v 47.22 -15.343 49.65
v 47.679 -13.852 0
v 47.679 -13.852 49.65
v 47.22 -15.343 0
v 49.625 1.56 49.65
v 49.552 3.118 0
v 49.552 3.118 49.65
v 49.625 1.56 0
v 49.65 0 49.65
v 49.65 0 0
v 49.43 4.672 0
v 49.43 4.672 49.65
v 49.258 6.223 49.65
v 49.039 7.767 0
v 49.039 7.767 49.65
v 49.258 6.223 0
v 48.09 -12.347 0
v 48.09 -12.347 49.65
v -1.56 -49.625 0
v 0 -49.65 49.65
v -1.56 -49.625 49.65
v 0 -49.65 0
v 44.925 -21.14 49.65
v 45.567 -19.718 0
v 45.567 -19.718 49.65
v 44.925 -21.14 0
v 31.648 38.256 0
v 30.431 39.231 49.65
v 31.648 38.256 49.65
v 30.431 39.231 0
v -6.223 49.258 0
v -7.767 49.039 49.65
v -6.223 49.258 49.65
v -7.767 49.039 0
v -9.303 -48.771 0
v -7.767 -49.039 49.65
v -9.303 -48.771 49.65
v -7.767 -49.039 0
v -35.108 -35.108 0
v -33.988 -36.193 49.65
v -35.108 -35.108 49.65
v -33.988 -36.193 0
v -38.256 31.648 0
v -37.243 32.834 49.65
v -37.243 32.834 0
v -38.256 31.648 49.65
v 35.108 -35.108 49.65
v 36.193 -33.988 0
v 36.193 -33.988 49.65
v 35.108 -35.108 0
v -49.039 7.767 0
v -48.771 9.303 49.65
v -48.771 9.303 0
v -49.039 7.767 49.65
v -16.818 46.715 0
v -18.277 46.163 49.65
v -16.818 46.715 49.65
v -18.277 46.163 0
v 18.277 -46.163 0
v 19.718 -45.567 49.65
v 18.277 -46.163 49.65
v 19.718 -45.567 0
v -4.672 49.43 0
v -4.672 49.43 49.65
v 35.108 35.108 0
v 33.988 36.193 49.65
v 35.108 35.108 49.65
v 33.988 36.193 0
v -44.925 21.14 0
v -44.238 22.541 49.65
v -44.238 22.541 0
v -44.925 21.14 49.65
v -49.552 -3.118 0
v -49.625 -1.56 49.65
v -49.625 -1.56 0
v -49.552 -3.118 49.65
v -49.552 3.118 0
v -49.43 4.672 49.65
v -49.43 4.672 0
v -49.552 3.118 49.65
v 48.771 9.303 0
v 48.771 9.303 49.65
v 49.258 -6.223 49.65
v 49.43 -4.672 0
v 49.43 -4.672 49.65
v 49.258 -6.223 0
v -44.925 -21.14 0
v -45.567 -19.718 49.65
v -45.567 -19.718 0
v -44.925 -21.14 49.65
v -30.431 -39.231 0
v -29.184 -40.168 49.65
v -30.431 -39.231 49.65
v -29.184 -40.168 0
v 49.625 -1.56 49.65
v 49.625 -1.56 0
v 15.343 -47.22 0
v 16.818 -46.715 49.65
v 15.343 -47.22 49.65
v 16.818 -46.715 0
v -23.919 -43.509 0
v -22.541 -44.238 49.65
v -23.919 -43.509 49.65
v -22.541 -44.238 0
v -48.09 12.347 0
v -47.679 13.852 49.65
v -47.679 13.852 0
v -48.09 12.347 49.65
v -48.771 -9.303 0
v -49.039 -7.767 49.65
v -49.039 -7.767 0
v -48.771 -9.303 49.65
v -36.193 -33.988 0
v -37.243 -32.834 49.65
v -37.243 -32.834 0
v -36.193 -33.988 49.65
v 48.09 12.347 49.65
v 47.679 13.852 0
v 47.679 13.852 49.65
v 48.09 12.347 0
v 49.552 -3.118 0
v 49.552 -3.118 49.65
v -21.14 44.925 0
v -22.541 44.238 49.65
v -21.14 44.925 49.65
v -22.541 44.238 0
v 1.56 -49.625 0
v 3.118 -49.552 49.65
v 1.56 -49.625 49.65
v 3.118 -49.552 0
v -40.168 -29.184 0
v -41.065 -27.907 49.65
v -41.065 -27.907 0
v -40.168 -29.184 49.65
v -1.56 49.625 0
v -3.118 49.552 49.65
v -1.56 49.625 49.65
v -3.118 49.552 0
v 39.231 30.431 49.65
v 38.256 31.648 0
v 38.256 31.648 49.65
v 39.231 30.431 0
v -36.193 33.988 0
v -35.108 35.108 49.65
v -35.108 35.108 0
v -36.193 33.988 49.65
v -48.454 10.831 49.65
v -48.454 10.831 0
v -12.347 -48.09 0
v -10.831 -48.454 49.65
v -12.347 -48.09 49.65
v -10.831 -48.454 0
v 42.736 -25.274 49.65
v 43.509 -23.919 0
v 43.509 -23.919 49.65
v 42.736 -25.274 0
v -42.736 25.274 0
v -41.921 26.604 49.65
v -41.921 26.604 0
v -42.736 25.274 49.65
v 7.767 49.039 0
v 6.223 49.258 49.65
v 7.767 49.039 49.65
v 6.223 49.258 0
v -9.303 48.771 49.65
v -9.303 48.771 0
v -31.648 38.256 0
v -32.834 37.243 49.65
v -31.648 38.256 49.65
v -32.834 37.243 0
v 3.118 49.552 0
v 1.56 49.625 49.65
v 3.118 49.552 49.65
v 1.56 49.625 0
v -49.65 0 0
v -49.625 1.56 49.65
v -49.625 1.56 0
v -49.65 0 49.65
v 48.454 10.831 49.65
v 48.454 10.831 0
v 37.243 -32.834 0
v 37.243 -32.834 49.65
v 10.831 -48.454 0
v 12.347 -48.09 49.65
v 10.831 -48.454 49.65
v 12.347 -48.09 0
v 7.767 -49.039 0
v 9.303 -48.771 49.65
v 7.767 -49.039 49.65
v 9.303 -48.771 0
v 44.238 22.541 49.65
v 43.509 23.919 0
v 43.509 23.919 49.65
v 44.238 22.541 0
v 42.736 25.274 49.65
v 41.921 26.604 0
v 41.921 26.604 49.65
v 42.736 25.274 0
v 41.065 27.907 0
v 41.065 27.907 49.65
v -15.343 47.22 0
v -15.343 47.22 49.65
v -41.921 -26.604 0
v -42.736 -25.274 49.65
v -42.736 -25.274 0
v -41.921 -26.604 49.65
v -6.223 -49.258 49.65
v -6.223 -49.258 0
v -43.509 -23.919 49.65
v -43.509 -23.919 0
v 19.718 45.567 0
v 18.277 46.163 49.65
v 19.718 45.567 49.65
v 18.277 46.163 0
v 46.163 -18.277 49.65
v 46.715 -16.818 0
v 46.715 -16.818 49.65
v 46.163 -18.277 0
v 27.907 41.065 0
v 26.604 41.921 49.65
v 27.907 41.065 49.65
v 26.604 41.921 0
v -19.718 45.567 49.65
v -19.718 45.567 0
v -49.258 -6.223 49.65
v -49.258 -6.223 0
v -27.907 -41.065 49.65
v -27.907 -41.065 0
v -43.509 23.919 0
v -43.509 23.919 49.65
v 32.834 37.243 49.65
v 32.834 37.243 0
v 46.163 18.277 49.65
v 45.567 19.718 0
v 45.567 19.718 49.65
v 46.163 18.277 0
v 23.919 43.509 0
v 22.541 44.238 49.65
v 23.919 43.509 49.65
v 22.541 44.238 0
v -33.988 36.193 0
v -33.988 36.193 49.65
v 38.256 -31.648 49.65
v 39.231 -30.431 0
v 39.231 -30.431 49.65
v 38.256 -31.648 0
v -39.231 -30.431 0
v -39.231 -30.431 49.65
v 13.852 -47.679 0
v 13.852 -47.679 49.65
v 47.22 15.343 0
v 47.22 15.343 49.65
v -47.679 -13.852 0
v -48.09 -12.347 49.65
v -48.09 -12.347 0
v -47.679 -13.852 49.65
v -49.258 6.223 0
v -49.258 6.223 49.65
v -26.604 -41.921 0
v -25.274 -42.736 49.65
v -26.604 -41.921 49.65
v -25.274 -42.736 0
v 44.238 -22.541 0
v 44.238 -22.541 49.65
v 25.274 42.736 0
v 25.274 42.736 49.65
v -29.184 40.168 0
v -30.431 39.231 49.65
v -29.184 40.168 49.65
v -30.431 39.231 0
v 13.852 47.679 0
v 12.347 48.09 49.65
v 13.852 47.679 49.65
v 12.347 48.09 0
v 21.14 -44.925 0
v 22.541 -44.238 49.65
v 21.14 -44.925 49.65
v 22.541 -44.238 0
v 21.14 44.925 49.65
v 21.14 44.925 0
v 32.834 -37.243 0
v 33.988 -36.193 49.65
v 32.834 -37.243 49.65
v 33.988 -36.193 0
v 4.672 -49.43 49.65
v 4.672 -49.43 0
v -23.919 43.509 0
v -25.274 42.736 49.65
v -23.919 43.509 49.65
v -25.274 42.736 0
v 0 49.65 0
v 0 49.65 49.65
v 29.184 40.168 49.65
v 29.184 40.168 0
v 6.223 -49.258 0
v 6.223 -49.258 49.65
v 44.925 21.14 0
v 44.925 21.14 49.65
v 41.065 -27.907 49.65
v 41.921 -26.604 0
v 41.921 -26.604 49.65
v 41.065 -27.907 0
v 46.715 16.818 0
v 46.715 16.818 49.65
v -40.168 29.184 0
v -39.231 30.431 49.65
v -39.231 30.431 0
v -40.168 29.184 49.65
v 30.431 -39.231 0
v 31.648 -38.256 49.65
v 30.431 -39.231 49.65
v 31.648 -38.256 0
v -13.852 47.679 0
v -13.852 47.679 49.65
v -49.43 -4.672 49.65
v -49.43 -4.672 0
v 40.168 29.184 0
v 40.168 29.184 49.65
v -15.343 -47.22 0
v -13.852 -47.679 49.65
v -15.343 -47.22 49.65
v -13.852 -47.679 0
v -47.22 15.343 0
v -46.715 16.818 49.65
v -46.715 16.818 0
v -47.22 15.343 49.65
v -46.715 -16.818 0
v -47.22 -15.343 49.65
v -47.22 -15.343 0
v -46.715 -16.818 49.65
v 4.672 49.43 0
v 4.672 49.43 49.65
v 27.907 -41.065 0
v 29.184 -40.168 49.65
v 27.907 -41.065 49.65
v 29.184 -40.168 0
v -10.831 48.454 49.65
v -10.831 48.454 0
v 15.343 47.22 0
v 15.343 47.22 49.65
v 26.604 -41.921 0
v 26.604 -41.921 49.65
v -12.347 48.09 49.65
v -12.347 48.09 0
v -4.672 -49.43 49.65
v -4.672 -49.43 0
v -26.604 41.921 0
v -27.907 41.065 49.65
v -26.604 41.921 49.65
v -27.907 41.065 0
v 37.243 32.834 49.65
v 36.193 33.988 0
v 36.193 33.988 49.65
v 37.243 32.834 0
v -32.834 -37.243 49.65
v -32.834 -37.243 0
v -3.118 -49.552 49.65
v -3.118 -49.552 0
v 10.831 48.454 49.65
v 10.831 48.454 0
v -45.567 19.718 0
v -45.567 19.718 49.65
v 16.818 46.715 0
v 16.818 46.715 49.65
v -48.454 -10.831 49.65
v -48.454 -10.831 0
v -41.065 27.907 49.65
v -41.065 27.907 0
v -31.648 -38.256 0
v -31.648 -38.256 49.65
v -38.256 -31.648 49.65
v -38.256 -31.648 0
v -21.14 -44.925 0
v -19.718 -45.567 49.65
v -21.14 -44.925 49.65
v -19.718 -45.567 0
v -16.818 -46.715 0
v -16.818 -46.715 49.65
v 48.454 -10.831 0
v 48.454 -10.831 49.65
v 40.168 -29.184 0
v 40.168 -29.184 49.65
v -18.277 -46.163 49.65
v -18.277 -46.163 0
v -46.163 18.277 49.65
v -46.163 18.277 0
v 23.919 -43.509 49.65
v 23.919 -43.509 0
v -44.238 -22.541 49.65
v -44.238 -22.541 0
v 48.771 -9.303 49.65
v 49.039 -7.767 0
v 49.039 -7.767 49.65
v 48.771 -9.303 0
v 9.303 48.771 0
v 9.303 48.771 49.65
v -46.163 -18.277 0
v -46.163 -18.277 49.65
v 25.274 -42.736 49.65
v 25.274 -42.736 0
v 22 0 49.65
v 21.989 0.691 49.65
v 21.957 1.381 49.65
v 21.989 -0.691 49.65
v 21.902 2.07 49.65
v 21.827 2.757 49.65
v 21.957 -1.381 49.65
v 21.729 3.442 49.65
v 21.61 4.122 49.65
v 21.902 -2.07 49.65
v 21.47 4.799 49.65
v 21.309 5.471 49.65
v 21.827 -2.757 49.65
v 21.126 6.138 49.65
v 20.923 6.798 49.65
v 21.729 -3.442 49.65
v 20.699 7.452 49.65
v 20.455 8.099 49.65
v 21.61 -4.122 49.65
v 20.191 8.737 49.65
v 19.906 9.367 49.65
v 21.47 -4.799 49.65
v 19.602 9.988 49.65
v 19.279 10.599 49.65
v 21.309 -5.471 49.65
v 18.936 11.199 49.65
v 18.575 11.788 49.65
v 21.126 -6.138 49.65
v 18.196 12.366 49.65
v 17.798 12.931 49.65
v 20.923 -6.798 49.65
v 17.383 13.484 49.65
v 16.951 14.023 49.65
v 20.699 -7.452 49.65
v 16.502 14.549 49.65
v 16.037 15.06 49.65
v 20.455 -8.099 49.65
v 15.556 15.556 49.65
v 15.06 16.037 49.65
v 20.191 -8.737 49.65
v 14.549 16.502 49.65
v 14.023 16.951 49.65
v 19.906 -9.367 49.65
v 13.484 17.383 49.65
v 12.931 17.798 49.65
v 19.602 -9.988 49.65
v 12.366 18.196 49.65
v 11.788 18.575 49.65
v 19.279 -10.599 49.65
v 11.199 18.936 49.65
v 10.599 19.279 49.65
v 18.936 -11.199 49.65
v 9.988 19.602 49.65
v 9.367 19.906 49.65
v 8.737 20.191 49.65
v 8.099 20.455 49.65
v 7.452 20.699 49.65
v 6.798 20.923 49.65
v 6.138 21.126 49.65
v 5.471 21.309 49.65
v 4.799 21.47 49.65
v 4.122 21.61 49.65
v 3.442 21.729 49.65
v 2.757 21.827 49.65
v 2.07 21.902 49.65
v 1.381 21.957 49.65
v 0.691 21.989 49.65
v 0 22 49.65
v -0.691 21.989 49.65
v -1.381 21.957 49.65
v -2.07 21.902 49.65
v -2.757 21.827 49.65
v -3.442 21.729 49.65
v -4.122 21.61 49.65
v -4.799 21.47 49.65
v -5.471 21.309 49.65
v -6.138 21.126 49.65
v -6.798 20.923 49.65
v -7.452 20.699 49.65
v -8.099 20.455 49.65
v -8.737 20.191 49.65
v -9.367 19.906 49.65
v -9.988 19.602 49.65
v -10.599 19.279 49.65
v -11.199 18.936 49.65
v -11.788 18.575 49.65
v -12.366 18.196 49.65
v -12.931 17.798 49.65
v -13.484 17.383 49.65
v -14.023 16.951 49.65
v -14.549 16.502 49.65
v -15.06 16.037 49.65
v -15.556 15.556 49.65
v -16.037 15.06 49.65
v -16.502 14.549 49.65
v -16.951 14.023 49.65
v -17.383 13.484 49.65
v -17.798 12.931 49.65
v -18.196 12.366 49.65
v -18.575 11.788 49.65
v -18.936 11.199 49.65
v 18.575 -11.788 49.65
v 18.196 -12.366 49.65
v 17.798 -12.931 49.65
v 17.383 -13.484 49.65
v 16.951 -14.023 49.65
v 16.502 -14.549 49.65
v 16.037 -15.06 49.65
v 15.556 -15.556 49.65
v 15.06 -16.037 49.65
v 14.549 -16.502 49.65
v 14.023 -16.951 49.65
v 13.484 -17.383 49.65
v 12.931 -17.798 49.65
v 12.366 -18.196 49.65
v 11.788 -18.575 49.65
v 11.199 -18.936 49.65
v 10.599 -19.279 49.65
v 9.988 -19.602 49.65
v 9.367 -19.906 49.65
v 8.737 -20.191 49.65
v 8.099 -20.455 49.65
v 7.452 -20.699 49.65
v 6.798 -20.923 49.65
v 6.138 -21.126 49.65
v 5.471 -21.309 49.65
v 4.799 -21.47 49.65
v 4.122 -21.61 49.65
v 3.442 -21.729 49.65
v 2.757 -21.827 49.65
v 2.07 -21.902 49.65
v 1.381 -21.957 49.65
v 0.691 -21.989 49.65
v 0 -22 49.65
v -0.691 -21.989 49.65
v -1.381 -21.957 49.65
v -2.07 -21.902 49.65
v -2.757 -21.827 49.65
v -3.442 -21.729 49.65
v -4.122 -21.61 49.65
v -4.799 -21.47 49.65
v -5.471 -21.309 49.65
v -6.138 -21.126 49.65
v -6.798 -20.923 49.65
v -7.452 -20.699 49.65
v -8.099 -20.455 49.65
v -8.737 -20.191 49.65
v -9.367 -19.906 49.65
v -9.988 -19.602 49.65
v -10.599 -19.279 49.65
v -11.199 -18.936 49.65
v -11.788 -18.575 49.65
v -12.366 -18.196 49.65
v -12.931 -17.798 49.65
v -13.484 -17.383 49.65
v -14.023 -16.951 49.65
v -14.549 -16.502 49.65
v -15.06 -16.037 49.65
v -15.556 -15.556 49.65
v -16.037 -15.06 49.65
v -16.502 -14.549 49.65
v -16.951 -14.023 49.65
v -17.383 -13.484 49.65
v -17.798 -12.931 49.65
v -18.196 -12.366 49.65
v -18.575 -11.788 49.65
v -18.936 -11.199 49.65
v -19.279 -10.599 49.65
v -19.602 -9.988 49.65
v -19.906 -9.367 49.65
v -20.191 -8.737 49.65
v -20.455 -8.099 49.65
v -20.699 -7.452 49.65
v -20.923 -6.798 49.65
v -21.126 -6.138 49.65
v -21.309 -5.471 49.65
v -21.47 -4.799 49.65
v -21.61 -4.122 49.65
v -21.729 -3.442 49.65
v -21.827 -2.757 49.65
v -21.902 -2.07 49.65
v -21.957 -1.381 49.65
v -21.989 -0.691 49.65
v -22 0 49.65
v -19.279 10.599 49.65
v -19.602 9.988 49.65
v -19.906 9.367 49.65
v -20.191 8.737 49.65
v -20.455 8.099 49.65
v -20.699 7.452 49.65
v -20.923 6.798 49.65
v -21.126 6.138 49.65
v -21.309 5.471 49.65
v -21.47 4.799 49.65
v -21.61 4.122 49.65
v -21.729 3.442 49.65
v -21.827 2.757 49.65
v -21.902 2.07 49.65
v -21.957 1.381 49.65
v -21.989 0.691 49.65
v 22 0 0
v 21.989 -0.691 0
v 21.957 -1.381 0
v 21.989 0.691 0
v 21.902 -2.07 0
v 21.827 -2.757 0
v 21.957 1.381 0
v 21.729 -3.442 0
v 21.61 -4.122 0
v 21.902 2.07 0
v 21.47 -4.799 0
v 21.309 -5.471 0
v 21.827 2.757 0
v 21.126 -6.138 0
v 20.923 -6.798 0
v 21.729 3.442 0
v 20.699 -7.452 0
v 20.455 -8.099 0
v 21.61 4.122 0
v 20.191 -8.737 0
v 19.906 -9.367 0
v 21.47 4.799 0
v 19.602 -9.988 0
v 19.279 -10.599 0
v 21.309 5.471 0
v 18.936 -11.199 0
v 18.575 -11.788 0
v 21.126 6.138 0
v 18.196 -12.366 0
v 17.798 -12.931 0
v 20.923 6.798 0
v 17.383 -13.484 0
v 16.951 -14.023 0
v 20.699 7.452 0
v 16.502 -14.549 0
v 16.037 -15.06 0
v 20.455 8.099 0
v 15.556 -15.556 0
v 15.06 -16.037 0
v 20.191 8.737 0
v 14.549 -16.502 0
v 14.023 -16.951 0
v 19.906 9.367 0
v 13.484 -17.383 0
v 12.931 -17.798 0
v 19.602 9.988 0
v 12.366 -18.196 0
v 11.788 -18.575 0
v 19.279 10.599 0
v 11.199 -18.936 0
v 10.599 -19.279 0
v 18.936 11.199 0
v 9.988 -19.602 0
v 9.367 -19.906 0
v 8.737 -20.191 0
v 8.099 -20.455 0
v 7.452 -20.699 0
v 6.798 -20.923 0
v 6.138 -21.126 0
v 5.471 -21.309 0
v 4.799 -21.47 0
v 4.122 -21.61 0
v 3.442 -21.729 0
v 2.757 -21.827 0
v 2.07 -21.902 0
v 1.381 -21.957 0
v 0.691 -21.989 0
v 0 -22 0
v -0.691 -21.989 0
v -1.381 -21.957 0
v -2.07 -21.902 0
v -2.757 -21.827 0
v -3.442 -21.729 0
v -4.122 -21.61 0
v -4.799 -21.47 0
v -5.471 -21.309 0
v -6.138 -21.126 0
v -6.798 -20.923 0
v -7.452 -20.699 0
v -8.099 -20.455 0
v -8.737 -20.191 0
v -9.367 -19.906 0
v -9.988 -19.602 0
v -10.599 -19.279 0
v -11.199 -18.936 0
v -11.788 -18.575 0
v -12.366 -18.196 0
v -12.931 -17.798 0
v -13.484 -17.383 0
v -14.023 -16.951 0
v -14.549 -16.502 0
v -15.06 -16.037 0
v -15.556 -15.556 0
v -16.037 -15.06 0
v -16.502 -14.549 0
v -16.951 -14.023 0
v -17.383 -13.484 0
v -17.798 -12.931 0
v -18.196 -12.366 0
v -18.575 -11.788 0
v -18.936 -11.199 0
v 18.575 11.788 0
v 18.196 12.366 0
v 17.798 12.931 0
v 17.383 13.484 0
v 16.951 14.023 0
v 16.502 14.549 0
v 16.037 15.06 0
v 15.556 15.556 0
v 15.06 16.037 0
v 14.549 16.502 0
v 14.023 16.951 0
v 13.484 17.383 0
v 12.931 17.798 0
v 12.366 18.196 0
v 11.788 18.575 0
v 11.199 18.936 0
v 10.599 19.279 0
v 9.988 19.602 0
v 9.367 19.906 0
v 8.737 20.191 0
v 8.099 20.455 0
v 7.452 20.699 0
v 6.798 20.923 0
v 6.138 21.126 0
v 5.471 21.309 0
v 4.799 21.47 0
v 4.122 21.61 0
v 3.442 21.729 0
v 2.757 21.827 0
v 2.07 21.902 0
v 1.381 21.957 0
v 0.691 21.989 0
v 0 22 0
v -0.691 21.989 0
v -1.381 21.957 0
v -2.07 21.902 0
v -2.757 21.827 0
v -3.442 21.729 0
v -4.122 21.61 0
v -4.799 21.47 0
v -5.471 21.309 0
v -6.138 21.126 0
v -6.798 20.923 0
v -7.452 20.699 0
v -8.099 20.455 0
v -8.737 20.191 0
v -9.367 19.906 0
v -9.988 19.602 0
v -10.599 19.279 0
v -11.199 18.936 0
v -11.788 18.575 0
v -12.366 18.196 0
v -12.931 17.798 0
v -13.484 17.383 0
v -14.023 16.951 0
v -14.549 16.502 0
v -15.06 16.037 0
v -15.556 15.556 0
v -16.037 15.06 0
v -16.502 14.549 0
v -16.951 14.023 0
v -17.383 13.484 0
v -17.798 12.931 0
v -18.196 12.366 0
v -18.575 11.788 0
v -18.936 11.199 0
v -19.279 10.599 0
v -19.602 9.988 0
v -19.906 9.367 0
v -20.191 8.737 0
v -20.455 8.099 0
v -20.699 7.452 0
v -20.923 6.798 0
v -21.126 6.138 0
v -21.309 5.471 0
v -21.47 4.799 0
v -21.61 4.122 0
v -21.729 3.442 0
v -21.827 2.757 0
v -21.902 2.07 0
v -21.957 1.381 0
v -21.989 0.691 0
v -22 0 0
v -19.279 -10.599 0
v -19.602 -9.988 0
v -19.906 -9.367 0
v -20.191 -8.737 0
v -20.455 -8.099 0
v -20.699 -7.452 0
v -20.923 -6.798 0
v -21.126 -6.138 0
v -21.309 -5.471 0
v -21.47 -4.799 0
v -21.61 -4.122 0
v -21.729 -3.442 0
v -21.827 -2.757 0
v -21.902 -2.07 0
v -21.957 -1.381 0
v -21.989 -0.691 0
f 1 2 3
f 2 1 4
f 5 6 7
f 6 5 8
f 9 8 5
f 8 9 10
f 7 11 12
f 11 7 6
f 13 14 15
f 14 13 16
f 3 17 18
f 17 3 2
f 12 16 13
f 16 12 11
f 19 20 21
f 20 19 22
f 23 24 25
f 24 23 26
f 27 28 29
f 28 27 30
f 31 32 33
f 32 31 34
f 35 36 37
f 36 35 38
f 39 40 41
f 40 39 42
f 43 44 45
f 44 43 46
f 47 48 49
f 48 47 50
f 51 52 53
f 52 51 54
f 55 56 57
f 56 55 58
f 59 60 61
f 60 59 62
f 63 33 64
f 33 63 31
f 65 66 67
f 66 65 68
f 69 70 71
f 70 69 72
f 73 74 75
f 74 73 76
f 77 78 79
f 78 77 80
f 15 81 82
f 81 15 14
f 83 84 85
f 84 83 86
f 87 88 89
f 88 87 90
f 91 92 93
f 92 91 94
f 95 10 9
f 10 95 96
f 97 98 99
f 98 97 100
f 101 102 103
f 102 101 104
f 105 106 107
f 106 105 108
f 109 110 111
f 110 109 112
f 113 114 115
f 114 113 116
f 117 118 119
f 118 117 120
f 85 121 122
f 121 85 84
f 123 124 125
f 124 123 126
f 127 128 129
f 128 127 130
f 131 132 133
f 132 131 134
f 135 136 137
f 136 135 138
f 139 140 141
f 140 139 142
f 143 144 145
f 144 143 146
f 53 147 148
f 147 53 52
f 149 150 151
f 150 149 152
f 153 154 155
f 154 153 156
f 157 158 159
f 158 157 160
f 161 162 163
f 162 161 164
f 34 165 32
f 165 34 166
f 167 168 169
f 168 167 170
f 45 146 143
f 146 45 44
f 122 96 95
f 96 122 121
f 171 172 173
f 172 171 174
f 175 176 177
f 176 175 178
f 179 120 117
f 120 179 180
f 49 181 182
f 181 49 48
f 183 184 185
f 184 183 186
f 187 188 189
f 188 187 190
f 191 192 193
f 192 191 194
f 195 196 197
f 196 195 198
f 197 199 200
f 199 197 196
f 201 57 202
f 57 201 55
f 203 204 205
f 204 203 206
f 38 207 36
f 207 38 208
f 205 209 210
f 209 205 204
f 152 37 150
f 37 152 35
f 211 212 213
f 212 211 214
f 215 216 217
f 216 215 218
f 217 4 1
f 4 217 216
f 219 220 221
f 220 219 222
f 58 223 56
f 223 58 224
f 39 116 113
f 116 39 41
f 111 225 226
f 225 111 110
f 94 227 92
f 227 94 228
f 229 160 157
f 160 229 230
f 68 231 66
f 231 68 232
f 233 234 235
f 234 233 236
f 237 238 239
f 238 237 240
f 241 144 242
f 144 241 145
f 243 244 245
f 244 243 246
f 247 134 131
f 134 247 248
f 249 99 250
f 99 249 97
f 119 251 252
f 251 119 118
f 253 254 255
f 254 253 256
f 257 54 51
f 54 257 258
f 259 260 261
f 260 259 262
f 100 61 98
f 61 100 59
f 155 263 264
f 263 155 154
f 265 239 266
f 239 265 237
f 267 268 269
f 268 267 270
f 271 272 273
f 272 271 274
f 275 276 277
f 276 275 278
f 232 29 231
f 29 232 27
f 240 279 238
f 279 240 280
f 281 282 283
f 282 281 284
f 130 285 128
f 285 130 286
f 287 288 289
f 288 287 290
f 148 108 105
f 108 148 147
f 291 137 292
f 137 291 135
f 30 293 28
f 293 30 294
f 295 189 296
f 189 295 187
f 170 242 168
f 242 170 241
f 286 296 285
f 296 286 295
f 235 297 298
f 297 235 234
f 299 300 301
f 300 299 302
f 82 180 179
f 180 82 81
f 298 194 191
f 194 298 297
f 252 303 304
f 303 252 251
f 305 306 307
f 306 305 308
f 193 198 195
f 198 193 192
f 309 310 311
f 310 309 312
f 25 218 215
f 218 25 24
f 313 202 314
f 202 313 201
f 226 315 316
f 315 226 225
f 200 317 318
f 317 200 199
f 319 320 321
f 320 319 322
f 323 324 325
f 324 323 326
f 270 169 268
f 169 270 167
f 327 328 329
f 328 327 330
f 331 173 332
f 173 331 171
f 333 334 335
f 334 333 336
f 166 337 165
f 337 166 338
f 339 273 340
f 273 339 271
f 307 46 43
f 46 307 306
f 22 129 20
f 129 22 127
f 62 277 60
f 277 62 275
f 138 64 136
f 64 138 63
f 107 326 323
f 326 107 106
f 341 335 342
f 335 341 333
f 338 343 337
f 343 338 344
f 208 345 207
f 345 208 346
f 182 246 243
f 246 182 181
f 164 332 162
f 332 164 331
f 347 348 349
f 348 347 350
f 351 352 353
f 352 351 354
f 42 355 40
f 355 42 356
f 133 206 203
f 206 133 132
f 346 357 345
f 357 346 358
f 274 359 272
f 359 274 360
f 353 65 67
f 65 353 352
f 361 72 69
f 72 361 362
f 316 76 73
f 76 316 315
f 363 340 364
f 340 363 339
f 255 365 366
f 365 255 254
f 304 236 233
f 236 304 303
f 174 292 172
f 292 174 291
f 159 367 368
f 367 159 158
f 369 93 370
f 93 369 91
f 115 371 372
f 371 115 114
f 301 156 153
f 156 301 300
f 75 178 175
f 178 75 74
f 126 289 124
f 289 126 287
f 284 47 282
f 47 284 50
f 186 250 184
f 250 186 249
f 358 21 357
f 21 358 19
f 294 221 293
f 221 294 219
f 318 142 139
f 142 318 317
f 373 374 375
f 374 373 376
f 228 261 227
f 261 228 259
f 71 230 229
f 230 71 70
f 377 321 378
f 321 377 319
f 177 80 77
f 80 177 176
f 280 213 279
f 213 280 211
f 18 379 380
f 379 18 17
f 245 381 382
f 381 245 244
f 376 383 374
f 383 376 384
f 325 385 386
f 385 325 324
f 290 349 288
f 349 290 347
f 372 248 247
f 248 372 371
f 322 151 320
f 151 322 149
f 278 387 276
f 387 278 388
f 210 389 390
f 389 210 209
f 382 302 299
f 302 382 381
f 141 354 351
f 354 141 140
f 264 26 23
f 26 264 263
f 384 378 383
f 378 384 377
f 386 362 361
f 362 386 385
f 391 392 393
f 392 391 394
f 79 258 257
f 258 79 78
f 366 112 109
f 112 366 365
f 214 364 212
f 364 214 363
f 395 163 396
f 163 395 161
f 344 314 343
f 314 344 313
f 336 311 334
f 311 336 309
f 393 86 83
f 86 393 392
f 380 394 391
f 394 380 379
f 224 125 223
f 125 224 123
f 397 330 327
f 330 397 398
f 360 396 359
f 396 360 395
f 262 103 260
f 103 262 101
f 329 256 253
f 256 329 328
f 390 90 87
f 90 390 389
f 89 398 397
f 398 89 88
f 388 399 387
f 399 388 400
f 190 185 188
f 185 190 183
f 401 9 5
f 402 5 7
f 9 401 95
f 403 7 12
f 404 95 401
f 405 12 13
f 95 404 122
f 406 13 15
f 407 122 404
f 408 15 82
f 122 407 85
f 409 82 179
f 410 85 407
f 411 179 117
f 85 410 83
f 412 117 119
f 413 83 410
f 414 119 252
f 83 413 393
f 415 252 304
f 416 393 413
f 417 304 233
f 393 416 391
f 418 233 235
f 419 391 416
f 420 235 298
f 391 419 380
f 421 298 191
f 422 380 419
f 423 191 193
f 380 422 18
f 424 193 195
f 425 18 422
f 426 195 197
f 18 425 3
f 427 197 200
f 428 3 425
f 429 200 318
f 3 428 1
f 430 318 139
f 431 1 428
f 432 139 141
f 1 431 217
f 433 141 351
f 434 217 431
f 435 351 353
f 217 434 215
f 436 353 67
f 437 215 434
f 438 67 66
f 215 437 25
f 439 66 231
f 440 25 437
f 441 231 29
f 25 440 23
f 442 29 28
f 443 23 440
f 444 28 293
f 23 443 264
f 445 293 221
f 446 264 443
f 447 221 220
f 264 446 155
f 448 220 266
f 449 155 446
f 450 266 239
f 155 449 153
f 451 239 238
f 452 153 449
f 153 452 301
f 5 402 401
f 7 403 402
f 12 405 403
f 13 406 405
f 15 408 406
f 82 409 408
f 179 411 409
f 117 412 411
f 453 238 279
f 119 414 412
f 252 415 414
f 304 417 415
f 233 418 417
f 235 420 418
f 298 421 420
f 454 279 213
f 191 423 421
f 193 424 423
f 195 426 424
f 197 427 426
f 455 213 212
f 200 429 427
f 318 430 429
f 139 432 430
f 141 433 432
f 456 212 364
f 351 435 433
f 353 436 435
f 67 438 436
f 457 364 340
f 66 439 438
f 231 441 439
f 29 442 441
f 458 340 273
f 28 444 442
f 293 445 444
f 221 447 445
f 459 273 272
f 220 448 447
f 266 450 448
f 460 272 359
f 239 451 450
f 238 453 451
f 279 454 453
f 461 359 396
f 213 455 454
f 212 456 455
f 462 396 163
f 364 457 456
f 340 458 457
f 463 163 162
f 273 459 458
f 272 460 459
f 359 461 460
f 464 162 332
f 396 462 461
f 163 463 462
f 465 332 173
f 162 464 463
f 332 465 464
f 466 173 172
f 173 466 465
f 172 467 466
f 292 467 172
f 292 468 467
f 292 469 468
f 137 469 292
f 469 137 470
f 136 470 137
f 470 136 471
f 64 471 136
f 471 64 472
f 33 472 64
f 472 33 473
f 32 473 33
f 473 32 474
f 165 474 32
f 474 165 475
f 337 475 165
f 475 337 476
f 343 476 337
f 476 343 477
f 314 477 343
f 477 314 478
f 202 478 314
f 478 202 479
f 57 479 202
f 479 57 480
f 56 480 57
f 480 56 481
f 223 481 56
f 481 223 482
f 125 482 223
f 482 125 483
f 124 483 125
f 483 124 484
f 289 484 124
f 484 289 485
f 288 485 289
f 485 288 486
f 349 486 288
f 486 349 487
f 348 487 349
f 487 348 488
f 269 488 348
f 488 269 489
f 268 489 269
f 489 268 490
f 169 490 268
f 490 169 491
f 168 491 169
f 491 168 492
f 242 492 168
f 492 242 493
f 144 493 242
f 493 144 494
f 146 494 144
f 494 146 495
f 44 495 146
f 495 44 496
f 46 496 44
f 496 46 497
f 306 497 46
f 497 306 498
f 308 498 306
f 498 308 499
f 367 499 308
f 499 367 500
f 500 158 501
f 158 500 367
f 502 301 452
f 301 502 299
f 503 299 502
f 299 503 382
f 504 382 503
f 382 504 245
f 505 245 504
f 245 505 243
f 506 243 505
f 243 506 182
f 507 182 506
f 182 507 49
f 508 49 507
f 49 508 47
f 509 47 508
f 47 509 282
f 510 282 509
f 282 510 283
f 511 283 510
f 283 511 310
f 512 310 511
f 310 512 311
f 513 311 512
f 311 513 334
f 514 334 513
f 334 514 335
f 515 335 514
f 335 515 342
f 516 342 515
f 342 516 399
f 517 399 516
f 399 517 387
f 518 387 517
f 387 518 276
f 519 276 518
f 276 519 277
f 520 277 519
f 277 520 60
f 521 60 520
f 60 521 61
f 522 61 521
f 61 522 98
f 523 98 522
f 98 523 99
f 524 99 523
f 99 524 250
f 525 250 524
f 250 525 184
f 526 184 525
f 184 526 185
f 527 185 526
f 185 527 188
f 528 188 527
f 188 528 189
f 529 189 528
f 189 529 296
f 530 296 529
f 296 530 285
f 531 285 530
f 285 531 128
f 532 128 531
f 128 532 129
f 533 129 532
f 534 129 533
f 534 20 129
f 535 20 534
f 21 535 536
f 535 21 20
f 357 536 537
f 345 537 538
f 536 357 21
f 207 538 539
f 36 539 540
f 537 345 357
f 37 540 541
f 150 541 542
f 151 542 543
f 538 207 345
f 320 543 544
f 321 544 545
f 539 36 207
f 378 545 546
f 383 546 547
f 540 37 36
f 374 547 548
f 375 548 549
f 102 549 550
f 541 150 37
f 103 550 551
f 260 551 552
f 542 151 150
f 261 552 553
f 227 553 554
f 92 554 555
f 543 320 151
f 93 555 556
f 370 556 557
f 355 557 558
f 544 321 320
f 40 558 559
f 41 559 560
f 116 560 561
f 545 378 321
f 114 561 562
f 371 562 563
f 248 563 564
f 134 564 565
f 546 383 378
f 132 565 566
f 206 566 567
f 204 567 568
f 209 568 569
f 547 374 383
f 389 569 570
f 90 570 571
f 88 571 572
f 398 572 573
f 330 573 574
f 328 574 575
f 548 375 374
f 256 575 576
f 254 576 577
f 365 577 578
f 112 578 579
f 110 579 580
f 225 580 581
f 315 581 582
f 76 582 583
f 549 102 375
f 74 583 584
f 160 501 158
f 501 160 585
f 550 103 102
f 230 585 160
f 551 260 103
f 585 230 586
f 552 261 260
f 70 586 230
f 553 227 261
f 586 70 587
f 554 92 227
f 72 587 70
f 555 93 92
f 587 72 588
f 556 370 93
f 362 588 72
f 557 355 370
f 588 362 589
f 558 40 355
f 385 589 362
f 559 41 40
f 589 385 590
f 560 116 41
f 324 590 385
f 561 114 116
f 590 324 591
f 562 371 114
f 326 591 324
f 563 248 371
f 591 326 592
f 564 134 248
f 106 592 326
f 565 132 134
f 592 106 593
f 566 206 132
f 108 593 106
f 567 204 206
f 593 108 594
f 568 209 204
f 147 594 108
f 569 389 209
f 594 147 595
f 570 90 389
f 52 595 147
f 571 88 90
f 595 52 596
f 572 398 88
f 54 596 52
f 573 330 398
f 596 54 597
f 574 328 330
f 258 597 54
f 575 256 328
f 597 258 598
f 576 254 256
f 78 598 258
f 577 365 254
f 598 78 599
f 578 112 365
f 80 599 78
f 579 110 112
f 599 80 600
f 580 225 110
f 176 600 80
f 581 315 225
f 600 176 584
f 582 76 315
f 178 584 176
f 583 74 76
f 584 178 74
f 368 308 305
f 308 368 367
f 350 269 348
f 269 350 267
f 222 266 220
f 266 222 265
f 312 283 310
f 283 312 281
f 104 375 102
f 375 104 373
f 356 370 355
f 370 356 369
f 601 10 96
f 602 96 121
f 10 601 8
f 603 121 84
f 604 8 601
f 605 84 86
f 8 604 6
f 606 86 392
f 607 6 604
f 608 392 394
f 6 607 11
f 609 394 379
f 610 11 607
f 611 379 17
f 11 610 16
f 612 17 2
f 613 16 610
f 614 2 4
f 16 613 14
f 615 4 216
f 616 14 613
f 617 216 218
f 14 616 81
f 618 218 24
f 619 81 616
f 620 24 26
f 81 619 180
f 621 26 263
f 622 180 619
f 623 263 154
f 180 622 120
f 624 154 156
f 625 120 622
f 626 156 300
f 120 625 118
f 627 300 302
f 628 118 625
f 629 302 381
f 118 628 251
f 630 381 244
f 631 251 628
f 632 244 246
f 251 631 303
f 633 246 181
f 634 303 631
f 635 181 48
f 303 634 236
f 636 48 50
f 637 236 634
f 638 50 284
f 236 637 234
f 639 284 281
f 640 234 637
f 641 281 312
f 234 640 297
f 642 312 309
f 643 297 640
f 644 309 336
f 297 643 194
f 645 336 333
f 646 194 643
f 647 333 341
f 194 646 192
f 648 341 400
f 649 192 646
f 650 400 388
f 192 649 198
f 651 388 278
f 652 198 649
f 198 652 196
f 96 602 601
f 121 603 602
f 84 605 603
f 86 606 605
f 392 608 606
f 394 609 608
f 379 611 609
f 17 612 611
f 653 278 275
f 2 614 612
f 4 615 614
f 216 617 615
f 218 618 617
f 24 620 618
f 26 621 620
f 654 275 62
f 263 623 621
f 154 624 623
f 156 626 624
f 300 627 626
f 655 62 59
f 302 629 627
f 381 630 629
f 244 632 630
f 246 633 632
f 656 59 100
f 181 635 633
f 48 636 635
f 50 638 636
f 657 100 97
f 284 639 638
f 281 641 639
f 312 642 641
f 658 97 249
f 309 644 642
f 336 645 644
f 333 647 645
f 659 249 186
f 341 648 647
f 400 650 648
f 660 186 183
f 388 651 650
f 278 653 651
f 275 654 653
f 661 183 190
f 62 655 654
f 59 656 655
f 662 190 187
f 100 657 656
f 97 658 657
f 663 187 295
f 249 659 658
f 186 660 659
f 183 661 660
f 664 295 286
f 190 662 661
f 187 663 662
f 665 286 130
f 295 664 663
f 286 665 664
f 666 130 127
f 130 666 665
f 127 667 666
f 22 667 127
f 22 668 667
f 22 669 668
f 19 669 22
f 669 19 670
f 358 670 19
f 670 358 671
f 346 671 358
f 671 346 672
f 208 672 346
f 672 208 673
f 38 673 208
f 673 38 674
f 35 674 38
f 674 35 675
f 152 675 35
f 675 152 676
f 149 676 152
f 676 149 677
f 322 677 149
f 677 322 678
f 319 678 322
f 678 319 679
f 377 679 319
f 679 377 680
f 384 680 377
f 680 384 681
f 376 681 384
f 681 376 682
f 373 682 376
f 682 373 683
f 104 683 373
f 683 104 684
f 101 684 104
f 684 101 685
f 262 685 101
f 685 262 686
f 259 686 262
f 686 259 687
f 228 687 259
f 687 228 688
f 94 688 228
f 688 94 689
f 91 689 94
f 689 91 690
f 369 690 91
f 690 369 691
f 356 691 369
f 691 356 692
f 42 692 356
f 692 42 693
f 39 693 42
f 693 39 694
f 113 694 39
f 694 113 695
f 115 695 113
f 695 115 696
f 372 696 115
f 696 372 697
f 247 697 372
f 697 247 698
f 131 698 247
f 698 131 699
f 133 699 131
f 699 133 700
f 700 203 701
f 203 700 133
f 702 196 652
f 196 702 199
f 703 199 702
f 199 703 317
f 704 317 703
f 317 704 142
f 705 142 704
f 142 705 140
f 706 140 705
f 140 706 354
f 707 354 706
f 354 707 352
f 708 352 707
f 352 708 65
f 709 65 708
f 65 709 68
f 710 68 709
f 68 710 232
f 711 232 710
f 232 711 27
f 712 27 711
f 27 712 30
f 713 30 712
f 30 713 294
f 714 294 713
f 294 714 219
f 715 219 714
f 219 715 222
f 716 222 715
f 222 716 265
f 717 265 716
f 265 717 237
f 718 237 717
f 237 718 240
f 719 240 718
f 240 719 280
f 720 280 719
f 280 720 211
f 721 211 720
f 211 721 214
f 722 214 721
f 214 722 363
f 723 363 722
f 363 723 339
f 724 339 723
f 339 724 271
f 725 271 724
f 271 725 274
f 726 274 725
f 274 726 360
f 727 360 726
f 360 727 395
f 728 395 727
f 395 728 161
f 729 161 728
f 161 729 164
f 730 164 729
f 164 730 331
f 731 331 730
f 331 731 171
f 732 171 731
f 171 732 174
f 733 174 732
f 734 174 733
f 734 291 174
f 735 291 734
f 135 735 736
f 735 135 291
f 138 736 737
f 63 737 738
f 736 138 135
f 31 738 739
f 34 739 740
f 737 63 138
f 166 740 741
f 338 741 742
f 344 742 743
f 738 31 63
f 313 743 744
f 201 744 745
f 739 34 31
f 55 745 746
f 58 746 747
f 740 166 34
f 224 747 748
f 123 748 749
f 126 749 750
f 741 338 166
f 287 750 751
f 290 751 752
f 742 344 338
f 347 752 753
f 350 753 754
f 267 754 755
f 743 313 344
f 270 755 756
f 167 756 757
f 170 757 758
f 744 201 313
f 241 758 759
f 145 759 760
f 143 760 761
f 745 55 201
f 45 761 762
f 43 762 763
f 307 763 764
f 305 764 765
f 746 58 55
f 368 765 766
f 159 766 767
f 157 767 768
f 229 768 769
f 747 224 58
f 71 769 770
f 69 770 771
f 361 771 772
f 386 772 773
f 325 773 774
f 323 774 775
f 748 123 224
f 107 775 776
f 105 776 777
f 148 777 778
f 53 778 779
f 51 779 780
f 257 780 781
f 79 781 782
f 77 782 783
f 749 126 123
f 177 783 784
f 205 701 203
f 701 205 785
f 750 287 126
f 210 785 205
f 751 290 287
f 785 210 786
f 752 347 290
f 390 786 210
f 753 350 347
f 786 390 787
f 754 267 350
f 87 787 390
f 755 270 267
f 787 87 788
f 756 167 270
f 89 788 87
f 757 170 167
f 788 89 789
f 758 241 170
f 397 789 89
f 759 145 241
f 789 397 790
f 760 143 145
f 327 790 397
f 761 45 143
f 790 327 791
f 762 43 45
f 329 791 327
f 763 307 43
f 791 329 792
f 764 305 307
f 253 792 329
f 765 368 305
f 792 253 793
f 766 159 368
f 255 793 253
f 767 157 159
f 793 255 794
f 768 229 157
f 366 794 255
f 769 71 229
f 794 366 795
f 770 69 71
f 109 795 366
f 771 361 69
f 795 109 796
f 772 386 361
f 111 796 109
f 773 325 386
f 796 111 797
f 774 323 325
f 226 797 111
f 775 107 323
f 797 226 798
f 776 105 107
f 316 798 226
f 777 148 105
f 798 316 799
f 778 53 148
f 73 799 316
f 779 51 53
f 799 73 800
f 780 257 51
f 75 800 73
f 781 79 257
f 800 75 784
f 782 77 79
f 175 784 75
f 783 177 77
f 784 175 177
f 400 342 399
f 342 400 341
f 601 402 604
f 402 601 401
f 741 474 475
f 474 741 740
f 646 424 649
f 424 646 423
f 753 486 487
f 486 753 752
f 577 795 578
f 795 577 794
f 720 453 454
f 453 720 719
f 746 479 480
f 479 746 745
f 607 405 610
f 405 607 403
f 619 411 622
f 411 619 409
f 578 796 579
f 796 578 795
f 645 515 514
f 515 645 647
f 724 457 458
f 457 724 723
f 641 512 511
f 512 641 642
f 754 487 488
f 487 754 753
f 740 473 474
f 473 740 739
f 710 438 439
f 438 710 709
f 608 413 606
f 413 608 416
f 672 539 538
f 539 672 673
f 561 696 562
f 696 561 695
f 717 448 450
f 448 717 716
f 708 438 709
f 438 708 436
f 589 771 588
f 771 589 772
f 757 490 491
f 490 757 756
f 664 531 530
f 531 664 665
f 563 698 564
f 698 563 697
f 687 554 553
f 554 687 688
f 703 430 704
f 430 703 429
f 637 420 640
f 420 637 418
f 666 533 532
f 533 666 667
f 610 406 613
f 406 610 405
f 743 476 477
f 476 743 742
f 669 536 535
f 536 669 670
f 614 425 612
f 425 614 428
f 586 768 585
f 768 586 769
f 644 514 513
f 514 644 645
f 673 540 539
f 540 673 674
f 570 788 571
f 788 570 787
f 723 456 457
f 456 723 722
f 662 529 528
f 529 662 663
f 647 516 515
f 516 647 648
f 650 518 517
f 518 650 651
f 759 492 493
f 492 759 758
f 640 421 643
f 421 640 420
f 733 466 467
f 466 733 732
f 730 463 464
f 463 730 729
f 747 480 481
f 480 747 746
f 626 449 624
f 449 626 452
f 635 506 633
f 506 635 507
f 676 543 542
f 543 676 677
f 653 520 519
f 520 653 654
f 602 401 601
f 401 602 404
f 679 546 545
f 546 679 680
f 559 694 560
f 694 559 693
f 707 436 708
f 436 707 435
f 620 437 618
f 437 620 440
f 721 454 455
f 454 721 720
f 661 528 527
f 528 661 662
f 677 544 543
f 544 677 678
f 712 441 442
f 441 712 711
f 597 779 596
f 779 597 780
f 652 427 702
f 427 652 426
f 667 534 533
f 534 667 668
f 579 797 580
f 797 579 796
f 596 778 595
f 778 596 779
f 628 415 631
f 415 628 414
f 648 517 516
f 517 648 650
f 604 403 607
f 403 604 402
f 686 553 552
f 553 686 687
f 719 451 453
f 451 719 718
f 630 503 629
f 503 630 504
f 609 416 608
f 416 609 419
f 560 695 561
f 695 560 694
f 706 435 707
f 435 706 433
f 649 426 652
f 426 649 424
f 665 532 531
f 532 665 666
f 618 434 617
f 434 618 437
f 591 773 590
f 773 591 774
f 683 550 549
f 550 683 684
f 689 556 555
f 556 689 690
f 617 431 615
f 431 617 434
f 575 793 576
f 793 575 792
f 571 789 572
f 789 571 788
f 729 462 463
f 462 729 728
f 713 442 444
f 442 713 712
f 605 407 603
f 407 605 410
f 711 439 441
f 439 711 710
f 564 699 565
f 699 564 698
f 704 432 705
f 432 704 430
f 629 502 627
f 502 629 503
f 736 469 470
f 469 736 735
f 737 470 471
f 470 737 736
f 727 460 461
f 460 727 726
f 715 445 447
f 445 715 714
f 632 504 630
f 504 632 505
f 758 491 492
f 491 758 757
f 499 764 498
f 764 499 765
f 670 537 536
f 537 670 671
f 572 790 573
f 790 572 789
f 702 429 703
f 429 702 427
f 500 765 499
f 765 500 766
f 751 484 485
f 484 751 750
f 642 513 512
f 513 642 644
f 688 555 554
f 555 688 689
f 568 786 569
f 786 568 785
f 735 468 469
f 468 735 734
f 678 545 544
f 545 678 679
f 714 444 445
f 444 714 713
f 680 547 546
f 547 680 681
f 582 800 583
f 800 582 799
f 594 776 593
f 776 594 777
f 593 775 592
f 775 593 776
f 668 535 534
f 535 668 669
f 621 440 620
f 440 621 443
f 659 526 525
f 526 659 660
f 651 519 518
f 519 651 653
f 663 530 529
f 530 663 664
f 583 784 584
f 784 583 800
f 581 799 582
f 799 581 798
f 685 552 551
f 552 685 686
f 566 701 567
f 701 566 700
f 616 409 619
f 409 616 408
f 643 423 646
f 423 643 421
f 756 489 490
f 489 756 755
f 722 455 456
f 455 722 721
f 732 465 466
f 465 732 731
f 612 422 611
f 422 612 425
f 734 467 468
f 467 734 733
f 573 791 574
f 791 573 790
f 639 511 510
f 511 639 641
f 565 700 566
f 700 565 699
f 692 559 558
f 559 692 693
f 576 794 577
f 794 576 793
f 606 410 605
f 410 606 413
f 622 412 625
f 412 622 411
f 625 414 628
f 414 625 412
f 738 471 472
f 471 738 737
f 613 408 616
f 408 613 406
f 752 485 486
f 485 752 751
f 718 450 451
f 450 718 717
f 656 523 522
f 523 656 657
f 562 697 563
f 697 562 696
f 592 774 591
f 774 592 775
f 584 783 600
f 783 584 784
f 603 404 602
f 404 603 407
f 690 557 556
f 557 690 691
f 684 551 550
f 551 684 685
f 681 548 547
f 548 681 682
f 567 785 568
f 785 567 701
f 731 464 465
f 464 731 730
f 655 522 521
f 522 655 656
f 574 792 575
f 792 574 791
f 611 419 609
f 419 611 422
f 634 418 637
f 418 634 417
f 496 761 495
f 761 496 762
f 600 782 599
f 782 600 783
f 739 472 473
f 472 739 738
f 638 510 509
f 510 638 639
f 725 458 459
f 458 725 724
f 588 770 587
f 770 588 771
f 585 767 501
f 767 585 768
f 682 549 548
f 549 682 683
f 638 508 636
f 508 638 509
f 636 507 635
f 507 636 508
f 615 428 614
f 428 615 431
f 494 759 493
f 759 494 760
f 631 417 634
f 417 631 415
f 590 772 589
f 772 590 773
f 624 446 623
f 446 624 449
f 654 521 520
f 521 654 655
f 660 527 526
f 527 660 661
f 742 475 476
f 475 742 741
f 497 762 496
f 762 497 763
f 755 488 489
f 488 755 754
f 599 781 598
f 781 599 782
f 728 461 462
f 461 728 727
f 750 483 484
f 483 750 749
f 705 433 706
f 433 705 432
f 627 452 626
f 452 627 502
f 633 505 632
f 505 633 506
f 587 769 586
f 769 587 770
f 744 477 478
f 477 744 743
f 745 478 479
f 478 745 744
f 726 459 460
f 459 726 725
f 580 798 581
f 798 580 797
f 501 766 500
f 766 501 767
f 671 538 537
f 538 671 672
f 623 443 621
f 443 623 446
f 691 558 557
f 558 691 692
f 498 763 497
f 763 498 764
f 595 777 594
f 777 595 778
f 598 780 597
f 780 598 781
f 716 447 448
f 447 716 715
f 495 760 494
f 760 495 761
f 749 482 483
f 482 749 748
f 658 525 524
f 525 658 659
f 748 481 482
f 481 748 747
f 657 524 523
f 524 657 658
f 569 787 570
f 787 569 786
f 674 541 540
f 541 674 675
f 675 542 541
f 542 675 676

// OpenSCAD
// Hollow cylinder (tube)
// OD = 99.3 mm, ID = 44 mm, H = 49.65 mm

OD = 99.3;
ID = 44;
H  = 49.65;

// 圆的分段数：越大越圆（也会更慢）
$fn = 200;

difference() {
    cylinder(h = H, d = OD, center = false);
    translate([0, 0, -0.1])
        cylinder(h = H + 0.2, d = ID, center = false); // +0.2 防止共面残留
}


module std_module(){
   difference() {
    cylinder(h = H, d = OD, center = false);
    translate([0, 0, -0.1])
        cylinder(h = H + 0.2, d = ID, center = false); // +0.2 防止共面残留
    } 
}
